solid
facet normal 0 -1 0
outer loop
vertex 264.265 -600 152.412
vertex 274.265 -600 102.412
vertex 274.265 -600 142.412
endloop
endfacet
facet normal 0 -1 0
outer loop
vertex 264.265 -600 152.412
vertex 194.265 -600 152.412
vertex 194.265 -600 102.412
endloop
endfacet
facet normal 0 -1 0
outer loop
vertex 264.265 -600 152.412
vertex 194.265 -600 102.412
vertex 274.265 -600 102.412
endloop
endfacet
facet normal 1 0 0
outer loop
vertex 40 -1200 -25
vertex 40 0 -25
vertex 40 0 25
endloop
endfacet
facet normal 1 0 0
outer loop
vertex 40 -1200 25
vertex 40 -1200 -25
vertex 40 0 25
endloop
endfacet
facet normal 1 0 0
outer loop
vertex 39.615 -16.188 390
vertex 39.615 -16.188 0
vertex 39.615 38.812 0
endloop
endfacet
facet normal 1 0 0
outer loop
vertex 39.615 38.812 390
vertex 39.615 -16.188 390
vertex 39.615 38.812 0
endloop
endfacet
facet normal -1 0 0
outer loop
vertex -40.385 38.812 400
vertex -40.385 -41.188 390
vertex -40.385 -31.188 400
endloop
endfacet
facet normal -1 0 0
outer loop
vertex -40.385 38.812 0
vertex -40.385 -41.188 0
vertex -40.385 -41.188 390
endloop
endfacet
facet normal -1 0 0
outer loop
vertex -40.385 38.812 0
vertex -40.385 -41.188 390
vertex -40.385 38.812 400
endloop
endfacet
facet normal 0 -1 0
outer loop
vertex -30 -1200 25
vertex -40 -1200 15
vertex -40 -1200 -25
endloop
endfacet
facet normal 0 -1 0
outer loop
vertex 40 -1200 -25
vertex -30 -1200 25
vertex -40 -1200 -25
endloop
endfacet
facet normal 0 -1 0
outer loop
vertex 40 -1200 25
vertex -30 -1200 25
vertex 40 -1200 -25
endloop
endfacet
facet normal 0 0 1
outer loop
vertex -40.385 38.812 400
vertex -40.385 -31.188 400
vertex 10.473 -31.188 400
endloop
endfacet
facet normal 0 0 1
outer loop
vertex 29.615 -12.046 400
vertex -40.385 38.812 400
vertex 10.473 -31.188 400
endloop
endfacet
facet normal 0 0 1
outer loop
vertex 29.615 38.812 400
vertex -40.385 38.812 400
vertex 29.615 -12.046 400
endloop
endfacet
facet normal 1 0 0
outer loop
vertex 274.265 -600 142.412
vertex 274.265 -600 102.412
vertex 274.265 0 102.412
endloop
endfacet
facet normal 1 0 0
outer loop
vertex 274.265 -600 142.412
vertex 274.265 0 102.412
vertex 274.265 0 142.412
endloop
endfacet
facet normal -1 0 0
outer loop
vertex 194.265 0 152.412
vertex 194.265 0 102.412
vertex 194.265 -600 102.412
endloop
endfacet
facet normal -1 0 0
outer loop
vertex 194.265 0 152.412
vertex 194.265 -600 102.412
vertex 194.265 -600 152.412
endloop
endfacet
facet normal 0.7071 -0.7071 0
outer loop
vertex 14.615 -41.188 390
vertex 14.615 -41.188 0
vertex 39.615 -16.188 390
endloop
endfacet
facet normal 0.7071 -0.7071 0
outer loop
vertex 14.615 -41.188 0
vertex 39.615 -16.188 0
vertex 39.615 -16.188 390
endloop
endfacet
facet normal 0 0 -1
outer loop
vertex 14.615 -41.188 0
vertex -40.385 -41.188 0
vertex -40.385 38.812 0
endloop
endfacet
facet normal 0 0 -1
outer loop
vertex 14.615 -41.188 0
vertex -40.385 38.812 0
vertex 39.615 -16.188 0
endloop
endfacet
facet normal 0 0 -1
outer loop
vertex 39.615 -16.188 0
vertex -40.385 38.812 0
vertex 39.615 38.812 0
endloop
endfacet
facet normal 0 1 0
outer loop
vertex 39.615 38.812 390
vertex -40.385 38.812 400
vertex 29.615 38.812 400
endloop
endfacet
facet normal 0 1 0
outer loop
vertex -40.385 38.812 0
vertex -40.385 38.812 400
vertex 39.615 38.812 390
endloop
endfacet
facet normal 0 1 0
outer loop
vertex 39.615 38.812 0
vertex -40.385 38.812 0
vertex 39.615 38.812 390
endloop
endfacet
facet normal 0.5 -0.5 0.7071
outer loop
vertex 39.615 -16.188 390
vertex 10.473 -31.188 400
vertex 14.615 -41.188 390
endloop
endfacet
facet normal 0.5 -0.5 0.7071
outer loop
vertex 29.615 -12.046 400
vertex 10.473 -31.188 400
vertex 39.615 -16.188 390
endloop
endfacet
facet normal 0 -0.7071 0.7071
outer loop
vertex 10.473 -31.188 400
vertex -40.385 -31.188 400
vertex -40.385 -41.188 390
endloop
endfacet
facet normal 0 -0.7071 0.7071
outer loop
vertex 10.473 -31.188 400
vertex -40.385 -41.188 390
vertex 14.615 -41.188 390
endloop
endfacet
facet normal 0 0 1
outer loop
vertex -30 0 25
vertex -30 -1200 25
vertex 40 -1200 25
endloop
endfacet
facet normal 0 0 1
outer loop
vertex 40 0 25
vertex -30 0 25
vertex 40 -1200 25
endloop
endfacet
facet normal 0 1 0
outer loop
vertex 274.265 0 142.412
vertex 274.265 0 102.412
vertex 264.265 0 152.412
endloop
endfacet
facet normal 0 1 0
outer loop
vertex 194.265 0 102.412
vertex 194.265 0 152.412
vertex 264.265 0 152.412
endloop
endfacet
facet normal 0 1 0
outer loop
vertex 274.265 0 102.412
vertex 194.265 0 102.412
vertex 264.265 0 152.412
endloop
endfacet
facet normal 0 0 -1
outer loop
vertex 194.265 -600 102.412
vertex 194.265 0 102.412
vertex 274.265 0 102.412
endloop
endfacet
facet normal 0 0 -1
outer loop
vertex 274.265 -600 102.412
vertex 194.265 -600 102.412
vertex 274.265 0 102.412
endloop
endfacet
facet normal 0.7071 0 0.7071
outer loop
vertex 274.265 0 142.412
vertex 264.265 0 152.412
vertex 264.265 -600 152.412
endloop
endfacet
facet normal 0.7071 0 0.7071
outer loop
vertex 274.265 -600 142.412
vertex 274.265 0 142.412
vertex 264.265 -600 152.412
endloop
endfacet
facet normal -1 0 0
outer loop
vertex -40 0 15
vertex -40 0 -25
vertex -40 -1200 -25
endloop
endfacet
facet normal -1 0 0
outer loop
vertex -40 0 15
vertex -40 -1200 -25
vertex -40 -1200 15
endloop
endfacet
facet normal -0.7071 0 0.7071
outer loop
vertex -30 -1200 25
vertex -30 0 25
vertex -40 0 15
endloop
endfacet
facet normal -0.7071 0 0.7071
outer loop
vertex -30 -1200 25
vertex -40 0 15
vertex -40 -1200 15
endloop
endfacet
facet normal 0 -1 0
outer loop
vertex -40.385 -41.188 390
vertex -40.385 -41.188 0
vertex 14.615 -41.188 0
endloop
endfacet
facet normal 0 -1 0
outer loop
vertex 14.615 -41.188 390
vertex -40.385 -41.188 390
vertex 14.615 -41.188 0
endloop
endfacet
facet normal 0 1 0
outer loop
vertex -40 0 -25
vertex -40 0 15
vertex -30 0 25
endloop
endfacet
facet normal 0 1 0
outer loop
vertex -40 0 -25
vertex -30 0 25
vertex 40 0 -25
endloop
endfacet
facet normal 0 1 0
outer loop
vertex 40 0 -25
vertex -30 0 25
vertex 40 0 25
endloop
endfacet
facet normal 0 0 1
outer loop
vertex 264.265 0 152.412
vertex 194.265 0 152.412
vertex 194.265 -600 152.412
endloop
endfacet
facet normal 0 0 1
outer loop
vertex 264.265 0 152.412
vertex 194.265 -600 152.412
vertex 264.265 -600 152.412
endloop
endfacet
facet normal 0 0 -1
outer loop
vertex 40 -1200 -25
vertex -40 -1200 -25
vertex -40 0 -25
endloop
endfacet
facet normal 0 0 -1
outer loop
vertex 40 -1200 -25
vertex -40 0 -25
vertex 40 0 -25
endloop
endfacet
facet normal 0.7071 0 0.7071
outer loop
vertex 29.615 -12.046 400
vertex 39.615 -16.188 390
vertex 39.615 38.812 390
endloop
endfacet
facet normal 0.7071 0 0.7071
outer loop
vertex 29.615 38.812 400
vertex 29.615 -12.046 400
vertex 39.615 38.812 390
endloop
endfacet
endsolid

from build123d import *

# Parameters (mm, degrees)
F0_W     = 80
F0_H     = 80
F1_DEPTH = 400
F2_SIZE  = 25
F3_SIZE  = 10
F4_W     = 80
F4_H     = 50
F5_DEPTH = 600
F6_W     = 80
F6_H     = 50
F7_DEPTH = 1200
F8_SIZE  = 10
F9_SIZE  = 10


with BuildPart() as f1:
    # F0 (on Top) → F1 (new body)
    with BuildSketch(Plane.XY):
        with Locations((-0.3851265647, -1.187727477)):
            Rectangle(F0_W, F0_H)
    extrude(amount=F1_DEPTH)

    # F2
    f2_edges = [f1.edges().sort_by_distance(p)[0] for p in [
        (39.614873, -41.187727, 200),
    ]]
    chamfer(f2_edges, length=F2_SIZE)

    # F3
    f3_edges = [f1.edges().sort_by_distance(p)[0] for p in [
        (-12.885127, -41.187727, 400),
        (39.614873, 11.312273, 400),
        (27.114873, -28.687727, 400),
    ]]
    chamfer(f3_edges, length=F3_SIZE)


with BuildPart() as f5:
    # F4 (on Front) → F5 (new body)
    with BuildSketch(Plane.XZ):
        with Locations((234.2652007937, 127.4122001697)):
            Rectangle(F4_W, F4_H)
    extrude(amount=F5_DEPTH)

    # F8
    f8_edges = [f5.edges().sort_by_distance(p)[0] for p in [
        (274.265201, -300, 152.4122),
    ]]
    chamfer(f8_edges, length=F8_SIZE)


with BuildPart() as f7:
    # F6 (on Front) → F7 (new body)
    with BuildSketch(Plane.XZ):
        Rectangle(F6_W, F6_H)
    extrude(amount=F7_DEPTH)

    # F9
    f9_edges = [f7.edges().sort_by_distance(p)[0] for p in [
        (-40, -600, 25),
    ]]
    chamfer(f9_edges, length=F9_SIZE)


solid = Compound([f1.part, f5.part, f7.part])
